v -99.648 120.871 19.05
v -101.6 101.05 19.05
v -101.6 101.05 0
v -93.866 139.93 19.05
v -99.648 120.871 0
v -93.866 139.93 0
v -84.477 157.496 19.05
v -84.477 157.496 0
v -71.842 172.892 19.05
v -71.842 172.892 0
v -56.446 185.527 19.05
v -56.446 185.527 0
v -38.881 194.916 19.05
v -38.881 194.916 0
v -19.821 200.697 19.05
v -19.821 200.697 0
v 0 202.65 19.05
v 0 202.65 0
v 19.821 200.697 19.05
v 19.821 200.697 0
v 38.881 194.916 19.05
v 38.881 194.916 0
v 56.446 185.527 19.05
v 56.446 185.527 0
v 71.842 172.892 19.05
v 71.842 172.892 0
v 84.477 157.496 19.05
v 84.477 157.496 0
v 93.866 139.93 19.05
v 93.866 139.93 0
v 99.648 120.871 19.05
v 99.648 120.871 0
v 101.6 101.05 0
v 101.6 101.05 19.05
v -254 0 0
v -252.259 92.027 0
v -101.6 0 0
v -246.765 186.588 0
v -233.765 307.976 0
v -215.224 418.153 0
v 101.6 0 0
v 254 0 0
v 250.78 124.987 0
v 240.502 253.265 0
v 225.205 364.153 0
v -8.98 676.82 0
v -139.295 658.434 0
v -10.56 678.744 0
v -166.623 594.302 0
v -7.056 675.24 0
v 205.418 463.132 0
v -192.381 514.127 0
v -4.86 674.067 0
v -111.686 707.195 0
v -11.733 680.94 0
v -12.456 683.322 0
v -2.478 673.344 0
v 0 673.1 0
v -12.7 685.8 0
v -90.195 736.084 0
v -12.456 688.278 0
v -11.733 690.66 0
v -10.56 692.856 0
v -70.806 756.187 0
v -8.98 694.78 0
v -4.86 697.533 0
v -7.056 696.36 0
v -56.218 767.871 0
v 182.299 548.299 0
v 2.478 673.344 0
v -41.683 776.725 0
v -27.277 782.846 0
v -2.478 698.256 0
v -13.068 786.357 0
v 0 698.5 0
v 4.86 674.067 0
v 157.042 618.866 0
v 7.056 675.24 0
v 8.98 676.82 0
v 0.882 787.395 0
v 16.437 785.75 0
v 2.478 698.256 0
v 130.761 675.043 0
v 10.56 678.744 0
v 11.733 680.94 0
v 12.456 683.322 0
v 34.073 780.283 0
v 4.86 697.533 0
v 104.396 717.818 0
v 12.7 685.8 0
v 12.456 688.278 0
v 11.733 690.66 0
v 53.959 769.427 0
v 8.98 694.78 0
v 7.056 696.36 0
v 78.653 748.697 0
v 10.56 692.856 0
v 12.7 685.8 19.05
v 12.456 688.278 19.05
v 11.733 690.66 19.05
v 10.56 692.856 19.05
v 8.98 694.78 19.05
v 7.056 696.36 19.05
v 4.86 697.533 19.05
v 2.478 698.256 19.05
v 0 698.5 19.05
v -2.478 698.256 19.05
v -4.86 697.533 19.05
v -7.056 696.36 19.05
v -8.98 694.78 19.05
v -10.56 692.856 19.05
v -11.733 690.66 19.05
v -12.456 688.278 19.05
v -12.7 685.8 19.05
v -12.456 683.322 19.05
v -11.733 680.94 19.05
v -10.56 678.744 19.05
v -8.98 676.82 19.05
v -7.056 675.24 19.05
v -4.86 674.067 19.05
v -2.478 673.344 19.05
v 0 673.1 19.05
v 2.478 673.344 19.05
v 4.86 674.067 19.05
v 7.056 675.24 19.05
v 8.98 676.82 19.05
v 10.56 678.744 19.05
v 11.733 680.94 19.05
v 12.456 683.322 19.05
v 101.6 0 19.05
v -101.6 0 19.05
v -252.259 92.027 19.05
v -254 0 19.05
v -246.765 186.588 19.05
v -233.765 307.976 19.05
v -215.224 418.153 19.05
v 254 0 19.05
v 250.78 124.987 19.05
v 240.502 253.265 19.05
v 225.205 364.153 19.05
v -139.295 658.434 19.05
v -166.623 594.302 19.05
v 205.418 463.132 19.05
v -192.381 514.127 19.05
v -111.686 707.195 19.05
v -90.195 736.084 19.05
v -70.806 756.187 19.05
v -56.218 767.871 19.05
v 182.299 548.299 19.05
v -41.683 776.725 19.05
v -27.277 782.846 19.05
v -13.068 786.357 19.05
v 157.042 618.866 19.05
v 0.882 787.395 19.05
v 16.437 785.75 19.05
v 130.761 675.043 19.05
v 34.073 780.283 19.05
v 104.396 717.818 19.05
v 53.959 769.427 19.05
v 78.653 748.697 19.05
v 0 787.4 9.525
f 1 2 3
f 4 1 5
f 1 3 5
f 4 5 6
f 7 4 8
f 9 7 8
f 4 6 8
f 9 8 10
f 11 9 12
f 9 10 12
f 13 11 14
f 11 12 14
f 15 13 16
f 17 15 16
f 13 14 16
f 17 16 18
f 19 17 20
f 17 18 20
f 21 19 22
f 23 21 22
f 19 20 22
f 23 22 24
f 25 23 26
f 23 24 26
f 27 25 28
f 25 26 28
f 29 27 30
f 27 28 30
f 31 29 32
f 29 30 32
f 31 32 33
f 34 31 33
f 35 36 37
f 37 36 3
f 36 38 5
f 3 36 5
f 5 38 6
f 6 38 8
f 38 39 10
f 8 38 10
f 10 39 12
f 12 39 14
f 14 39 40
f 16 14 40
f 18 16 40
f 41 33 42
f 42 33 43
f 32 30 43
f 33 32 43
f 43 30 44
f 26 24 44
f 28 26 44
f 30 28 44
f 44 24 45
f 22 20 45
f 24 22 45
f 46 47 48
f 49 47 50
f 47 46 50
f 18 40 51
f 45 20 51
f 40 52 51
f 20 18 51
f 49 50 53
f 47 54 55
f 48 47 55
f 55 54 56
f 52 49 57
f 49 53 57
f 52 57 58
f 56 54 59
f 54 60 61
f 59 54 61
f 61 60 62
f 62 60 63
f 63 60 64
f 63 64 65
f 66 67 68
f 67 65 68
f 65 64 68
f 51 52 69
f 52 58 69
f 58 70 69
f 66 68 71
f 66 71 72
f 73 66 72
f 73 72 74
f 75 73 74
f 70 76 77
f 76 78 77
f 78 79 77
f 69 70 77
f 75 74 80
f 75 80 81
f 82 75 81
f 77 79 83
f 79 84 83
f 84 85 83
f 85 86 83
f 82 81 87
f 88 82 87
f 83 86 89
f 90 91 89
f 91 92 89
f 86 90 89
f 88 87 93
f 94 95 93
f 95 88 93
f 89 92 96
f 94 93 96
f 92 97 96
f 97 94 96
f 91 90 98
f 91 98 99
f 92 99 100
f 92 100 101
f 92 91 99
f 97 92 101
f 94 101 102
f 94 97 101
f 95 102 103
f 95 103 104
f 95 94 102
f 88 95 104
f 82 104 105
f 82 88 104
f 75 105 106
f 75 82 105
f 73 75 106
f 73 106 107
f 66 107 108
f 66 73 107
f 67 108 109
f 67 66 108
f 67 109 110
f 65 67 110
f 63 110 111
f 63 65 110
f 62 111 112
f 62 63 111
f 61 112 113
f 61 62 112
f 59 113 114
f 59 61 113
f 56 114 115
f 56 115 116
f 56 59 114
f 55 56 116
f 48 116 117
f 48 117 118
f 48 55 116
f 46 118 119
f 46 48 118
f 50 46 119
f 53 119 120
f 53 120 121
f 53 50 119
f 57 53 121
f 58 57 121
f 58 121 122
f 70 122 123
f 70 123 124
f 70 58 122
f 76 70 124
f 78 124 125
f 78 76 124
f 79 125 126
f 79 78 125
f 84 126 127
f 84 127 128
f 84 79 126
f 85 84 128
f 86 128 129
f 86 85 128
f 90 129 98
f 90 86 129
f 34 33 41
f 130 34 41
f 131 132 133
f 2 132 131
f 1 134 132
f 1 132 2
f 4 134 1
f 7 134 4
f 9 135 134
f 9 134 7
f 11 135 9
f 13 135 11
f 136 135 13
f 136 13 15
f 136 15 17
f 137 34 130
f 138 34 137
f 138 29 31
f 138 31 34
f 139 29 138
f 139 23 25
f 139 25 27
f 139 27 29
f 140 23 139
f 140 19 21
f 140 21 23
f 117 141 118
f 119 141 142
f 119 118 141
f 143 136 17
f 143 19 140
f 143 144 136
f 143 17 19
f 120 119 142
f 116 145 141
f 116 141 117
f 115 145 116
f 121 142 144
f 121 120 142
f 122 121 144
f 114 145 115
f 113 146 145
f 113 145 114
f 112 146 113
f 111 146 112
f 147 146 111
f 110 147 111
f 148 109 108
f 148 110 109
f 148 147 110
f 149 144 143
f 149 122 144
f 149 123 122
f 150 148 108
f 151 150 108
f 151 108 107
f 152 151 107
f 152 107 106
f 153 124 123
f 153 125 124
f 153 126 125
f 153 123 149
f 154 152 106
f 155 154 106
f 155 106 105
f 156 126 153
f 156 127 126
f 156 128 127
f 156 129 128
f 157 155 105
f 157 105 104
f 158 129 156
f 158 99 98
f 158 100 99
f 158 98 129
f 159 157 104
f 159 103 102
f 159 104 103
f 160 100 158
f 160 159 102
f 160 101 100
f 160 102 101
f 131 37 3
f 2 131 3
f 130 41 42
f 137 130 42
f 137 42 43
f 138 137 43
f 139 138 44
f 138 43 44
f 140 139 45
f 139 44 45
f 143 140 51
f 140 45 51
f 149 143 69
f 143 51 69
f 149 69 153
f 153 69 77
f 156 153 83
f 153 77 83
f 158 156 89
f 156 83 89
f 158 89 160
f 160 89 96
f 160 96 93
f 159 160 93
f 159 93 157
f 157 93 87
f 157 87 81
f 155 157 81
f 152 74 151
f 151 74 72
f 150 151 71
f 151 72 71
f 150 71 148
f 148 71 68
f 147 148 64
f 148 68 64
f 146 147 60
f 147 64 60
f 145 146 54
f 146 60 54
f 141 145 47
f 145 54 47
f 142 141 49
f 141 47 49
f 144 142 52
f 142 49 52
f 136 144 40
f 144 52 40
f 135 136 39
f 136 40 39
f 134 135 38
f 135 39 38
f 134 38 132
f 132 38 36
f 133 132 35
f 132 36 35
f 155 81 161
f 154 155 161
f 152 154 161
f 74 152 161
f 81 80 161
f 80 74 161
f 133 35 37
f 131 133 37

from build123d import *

# Parameters (mm, degrees)
F0_R     = 12.7
F1_DEPTH = 19.05


with BuildPart() as f1:
    # F0 (on Top) → F1 (new body)
    with BuildSketch(Plane.XY):
        with BuildLine():
            Line((101.6, 0), (254, 0))
            add(Edge.make_bspline(
                [(254, 0), (254, 787.4), (0, 787.4), (-254, 787.4), (-254, 0)],
                knots=[1.5707963268, 1.5707963268, 1.5707963268, 3.1415926536, 3.1415926536, 4.7123889804, 4.7123889804, 4.7123889804], degree=2, weights=[1, 0.7071067812, 1, 0.7071067812, 1]))
            Line((-254, 0), (-101.6, 0))
            Line((-101.6, 0), (-101.6, 101.0496690869))
            ThreePointArc((-101.6, 101.0496690869), (0, 202.6496690869), (101.6, 101.0496690869))
            Line((101.6, 101.0496690869), (101.6, 0))
        make_face()
        with Locations((0, 685.8)):
            Circle(F0_R, mode=Mode.SUBTRACT)
    extrude(amount=F1_DEPTH)


solid = f1.part
